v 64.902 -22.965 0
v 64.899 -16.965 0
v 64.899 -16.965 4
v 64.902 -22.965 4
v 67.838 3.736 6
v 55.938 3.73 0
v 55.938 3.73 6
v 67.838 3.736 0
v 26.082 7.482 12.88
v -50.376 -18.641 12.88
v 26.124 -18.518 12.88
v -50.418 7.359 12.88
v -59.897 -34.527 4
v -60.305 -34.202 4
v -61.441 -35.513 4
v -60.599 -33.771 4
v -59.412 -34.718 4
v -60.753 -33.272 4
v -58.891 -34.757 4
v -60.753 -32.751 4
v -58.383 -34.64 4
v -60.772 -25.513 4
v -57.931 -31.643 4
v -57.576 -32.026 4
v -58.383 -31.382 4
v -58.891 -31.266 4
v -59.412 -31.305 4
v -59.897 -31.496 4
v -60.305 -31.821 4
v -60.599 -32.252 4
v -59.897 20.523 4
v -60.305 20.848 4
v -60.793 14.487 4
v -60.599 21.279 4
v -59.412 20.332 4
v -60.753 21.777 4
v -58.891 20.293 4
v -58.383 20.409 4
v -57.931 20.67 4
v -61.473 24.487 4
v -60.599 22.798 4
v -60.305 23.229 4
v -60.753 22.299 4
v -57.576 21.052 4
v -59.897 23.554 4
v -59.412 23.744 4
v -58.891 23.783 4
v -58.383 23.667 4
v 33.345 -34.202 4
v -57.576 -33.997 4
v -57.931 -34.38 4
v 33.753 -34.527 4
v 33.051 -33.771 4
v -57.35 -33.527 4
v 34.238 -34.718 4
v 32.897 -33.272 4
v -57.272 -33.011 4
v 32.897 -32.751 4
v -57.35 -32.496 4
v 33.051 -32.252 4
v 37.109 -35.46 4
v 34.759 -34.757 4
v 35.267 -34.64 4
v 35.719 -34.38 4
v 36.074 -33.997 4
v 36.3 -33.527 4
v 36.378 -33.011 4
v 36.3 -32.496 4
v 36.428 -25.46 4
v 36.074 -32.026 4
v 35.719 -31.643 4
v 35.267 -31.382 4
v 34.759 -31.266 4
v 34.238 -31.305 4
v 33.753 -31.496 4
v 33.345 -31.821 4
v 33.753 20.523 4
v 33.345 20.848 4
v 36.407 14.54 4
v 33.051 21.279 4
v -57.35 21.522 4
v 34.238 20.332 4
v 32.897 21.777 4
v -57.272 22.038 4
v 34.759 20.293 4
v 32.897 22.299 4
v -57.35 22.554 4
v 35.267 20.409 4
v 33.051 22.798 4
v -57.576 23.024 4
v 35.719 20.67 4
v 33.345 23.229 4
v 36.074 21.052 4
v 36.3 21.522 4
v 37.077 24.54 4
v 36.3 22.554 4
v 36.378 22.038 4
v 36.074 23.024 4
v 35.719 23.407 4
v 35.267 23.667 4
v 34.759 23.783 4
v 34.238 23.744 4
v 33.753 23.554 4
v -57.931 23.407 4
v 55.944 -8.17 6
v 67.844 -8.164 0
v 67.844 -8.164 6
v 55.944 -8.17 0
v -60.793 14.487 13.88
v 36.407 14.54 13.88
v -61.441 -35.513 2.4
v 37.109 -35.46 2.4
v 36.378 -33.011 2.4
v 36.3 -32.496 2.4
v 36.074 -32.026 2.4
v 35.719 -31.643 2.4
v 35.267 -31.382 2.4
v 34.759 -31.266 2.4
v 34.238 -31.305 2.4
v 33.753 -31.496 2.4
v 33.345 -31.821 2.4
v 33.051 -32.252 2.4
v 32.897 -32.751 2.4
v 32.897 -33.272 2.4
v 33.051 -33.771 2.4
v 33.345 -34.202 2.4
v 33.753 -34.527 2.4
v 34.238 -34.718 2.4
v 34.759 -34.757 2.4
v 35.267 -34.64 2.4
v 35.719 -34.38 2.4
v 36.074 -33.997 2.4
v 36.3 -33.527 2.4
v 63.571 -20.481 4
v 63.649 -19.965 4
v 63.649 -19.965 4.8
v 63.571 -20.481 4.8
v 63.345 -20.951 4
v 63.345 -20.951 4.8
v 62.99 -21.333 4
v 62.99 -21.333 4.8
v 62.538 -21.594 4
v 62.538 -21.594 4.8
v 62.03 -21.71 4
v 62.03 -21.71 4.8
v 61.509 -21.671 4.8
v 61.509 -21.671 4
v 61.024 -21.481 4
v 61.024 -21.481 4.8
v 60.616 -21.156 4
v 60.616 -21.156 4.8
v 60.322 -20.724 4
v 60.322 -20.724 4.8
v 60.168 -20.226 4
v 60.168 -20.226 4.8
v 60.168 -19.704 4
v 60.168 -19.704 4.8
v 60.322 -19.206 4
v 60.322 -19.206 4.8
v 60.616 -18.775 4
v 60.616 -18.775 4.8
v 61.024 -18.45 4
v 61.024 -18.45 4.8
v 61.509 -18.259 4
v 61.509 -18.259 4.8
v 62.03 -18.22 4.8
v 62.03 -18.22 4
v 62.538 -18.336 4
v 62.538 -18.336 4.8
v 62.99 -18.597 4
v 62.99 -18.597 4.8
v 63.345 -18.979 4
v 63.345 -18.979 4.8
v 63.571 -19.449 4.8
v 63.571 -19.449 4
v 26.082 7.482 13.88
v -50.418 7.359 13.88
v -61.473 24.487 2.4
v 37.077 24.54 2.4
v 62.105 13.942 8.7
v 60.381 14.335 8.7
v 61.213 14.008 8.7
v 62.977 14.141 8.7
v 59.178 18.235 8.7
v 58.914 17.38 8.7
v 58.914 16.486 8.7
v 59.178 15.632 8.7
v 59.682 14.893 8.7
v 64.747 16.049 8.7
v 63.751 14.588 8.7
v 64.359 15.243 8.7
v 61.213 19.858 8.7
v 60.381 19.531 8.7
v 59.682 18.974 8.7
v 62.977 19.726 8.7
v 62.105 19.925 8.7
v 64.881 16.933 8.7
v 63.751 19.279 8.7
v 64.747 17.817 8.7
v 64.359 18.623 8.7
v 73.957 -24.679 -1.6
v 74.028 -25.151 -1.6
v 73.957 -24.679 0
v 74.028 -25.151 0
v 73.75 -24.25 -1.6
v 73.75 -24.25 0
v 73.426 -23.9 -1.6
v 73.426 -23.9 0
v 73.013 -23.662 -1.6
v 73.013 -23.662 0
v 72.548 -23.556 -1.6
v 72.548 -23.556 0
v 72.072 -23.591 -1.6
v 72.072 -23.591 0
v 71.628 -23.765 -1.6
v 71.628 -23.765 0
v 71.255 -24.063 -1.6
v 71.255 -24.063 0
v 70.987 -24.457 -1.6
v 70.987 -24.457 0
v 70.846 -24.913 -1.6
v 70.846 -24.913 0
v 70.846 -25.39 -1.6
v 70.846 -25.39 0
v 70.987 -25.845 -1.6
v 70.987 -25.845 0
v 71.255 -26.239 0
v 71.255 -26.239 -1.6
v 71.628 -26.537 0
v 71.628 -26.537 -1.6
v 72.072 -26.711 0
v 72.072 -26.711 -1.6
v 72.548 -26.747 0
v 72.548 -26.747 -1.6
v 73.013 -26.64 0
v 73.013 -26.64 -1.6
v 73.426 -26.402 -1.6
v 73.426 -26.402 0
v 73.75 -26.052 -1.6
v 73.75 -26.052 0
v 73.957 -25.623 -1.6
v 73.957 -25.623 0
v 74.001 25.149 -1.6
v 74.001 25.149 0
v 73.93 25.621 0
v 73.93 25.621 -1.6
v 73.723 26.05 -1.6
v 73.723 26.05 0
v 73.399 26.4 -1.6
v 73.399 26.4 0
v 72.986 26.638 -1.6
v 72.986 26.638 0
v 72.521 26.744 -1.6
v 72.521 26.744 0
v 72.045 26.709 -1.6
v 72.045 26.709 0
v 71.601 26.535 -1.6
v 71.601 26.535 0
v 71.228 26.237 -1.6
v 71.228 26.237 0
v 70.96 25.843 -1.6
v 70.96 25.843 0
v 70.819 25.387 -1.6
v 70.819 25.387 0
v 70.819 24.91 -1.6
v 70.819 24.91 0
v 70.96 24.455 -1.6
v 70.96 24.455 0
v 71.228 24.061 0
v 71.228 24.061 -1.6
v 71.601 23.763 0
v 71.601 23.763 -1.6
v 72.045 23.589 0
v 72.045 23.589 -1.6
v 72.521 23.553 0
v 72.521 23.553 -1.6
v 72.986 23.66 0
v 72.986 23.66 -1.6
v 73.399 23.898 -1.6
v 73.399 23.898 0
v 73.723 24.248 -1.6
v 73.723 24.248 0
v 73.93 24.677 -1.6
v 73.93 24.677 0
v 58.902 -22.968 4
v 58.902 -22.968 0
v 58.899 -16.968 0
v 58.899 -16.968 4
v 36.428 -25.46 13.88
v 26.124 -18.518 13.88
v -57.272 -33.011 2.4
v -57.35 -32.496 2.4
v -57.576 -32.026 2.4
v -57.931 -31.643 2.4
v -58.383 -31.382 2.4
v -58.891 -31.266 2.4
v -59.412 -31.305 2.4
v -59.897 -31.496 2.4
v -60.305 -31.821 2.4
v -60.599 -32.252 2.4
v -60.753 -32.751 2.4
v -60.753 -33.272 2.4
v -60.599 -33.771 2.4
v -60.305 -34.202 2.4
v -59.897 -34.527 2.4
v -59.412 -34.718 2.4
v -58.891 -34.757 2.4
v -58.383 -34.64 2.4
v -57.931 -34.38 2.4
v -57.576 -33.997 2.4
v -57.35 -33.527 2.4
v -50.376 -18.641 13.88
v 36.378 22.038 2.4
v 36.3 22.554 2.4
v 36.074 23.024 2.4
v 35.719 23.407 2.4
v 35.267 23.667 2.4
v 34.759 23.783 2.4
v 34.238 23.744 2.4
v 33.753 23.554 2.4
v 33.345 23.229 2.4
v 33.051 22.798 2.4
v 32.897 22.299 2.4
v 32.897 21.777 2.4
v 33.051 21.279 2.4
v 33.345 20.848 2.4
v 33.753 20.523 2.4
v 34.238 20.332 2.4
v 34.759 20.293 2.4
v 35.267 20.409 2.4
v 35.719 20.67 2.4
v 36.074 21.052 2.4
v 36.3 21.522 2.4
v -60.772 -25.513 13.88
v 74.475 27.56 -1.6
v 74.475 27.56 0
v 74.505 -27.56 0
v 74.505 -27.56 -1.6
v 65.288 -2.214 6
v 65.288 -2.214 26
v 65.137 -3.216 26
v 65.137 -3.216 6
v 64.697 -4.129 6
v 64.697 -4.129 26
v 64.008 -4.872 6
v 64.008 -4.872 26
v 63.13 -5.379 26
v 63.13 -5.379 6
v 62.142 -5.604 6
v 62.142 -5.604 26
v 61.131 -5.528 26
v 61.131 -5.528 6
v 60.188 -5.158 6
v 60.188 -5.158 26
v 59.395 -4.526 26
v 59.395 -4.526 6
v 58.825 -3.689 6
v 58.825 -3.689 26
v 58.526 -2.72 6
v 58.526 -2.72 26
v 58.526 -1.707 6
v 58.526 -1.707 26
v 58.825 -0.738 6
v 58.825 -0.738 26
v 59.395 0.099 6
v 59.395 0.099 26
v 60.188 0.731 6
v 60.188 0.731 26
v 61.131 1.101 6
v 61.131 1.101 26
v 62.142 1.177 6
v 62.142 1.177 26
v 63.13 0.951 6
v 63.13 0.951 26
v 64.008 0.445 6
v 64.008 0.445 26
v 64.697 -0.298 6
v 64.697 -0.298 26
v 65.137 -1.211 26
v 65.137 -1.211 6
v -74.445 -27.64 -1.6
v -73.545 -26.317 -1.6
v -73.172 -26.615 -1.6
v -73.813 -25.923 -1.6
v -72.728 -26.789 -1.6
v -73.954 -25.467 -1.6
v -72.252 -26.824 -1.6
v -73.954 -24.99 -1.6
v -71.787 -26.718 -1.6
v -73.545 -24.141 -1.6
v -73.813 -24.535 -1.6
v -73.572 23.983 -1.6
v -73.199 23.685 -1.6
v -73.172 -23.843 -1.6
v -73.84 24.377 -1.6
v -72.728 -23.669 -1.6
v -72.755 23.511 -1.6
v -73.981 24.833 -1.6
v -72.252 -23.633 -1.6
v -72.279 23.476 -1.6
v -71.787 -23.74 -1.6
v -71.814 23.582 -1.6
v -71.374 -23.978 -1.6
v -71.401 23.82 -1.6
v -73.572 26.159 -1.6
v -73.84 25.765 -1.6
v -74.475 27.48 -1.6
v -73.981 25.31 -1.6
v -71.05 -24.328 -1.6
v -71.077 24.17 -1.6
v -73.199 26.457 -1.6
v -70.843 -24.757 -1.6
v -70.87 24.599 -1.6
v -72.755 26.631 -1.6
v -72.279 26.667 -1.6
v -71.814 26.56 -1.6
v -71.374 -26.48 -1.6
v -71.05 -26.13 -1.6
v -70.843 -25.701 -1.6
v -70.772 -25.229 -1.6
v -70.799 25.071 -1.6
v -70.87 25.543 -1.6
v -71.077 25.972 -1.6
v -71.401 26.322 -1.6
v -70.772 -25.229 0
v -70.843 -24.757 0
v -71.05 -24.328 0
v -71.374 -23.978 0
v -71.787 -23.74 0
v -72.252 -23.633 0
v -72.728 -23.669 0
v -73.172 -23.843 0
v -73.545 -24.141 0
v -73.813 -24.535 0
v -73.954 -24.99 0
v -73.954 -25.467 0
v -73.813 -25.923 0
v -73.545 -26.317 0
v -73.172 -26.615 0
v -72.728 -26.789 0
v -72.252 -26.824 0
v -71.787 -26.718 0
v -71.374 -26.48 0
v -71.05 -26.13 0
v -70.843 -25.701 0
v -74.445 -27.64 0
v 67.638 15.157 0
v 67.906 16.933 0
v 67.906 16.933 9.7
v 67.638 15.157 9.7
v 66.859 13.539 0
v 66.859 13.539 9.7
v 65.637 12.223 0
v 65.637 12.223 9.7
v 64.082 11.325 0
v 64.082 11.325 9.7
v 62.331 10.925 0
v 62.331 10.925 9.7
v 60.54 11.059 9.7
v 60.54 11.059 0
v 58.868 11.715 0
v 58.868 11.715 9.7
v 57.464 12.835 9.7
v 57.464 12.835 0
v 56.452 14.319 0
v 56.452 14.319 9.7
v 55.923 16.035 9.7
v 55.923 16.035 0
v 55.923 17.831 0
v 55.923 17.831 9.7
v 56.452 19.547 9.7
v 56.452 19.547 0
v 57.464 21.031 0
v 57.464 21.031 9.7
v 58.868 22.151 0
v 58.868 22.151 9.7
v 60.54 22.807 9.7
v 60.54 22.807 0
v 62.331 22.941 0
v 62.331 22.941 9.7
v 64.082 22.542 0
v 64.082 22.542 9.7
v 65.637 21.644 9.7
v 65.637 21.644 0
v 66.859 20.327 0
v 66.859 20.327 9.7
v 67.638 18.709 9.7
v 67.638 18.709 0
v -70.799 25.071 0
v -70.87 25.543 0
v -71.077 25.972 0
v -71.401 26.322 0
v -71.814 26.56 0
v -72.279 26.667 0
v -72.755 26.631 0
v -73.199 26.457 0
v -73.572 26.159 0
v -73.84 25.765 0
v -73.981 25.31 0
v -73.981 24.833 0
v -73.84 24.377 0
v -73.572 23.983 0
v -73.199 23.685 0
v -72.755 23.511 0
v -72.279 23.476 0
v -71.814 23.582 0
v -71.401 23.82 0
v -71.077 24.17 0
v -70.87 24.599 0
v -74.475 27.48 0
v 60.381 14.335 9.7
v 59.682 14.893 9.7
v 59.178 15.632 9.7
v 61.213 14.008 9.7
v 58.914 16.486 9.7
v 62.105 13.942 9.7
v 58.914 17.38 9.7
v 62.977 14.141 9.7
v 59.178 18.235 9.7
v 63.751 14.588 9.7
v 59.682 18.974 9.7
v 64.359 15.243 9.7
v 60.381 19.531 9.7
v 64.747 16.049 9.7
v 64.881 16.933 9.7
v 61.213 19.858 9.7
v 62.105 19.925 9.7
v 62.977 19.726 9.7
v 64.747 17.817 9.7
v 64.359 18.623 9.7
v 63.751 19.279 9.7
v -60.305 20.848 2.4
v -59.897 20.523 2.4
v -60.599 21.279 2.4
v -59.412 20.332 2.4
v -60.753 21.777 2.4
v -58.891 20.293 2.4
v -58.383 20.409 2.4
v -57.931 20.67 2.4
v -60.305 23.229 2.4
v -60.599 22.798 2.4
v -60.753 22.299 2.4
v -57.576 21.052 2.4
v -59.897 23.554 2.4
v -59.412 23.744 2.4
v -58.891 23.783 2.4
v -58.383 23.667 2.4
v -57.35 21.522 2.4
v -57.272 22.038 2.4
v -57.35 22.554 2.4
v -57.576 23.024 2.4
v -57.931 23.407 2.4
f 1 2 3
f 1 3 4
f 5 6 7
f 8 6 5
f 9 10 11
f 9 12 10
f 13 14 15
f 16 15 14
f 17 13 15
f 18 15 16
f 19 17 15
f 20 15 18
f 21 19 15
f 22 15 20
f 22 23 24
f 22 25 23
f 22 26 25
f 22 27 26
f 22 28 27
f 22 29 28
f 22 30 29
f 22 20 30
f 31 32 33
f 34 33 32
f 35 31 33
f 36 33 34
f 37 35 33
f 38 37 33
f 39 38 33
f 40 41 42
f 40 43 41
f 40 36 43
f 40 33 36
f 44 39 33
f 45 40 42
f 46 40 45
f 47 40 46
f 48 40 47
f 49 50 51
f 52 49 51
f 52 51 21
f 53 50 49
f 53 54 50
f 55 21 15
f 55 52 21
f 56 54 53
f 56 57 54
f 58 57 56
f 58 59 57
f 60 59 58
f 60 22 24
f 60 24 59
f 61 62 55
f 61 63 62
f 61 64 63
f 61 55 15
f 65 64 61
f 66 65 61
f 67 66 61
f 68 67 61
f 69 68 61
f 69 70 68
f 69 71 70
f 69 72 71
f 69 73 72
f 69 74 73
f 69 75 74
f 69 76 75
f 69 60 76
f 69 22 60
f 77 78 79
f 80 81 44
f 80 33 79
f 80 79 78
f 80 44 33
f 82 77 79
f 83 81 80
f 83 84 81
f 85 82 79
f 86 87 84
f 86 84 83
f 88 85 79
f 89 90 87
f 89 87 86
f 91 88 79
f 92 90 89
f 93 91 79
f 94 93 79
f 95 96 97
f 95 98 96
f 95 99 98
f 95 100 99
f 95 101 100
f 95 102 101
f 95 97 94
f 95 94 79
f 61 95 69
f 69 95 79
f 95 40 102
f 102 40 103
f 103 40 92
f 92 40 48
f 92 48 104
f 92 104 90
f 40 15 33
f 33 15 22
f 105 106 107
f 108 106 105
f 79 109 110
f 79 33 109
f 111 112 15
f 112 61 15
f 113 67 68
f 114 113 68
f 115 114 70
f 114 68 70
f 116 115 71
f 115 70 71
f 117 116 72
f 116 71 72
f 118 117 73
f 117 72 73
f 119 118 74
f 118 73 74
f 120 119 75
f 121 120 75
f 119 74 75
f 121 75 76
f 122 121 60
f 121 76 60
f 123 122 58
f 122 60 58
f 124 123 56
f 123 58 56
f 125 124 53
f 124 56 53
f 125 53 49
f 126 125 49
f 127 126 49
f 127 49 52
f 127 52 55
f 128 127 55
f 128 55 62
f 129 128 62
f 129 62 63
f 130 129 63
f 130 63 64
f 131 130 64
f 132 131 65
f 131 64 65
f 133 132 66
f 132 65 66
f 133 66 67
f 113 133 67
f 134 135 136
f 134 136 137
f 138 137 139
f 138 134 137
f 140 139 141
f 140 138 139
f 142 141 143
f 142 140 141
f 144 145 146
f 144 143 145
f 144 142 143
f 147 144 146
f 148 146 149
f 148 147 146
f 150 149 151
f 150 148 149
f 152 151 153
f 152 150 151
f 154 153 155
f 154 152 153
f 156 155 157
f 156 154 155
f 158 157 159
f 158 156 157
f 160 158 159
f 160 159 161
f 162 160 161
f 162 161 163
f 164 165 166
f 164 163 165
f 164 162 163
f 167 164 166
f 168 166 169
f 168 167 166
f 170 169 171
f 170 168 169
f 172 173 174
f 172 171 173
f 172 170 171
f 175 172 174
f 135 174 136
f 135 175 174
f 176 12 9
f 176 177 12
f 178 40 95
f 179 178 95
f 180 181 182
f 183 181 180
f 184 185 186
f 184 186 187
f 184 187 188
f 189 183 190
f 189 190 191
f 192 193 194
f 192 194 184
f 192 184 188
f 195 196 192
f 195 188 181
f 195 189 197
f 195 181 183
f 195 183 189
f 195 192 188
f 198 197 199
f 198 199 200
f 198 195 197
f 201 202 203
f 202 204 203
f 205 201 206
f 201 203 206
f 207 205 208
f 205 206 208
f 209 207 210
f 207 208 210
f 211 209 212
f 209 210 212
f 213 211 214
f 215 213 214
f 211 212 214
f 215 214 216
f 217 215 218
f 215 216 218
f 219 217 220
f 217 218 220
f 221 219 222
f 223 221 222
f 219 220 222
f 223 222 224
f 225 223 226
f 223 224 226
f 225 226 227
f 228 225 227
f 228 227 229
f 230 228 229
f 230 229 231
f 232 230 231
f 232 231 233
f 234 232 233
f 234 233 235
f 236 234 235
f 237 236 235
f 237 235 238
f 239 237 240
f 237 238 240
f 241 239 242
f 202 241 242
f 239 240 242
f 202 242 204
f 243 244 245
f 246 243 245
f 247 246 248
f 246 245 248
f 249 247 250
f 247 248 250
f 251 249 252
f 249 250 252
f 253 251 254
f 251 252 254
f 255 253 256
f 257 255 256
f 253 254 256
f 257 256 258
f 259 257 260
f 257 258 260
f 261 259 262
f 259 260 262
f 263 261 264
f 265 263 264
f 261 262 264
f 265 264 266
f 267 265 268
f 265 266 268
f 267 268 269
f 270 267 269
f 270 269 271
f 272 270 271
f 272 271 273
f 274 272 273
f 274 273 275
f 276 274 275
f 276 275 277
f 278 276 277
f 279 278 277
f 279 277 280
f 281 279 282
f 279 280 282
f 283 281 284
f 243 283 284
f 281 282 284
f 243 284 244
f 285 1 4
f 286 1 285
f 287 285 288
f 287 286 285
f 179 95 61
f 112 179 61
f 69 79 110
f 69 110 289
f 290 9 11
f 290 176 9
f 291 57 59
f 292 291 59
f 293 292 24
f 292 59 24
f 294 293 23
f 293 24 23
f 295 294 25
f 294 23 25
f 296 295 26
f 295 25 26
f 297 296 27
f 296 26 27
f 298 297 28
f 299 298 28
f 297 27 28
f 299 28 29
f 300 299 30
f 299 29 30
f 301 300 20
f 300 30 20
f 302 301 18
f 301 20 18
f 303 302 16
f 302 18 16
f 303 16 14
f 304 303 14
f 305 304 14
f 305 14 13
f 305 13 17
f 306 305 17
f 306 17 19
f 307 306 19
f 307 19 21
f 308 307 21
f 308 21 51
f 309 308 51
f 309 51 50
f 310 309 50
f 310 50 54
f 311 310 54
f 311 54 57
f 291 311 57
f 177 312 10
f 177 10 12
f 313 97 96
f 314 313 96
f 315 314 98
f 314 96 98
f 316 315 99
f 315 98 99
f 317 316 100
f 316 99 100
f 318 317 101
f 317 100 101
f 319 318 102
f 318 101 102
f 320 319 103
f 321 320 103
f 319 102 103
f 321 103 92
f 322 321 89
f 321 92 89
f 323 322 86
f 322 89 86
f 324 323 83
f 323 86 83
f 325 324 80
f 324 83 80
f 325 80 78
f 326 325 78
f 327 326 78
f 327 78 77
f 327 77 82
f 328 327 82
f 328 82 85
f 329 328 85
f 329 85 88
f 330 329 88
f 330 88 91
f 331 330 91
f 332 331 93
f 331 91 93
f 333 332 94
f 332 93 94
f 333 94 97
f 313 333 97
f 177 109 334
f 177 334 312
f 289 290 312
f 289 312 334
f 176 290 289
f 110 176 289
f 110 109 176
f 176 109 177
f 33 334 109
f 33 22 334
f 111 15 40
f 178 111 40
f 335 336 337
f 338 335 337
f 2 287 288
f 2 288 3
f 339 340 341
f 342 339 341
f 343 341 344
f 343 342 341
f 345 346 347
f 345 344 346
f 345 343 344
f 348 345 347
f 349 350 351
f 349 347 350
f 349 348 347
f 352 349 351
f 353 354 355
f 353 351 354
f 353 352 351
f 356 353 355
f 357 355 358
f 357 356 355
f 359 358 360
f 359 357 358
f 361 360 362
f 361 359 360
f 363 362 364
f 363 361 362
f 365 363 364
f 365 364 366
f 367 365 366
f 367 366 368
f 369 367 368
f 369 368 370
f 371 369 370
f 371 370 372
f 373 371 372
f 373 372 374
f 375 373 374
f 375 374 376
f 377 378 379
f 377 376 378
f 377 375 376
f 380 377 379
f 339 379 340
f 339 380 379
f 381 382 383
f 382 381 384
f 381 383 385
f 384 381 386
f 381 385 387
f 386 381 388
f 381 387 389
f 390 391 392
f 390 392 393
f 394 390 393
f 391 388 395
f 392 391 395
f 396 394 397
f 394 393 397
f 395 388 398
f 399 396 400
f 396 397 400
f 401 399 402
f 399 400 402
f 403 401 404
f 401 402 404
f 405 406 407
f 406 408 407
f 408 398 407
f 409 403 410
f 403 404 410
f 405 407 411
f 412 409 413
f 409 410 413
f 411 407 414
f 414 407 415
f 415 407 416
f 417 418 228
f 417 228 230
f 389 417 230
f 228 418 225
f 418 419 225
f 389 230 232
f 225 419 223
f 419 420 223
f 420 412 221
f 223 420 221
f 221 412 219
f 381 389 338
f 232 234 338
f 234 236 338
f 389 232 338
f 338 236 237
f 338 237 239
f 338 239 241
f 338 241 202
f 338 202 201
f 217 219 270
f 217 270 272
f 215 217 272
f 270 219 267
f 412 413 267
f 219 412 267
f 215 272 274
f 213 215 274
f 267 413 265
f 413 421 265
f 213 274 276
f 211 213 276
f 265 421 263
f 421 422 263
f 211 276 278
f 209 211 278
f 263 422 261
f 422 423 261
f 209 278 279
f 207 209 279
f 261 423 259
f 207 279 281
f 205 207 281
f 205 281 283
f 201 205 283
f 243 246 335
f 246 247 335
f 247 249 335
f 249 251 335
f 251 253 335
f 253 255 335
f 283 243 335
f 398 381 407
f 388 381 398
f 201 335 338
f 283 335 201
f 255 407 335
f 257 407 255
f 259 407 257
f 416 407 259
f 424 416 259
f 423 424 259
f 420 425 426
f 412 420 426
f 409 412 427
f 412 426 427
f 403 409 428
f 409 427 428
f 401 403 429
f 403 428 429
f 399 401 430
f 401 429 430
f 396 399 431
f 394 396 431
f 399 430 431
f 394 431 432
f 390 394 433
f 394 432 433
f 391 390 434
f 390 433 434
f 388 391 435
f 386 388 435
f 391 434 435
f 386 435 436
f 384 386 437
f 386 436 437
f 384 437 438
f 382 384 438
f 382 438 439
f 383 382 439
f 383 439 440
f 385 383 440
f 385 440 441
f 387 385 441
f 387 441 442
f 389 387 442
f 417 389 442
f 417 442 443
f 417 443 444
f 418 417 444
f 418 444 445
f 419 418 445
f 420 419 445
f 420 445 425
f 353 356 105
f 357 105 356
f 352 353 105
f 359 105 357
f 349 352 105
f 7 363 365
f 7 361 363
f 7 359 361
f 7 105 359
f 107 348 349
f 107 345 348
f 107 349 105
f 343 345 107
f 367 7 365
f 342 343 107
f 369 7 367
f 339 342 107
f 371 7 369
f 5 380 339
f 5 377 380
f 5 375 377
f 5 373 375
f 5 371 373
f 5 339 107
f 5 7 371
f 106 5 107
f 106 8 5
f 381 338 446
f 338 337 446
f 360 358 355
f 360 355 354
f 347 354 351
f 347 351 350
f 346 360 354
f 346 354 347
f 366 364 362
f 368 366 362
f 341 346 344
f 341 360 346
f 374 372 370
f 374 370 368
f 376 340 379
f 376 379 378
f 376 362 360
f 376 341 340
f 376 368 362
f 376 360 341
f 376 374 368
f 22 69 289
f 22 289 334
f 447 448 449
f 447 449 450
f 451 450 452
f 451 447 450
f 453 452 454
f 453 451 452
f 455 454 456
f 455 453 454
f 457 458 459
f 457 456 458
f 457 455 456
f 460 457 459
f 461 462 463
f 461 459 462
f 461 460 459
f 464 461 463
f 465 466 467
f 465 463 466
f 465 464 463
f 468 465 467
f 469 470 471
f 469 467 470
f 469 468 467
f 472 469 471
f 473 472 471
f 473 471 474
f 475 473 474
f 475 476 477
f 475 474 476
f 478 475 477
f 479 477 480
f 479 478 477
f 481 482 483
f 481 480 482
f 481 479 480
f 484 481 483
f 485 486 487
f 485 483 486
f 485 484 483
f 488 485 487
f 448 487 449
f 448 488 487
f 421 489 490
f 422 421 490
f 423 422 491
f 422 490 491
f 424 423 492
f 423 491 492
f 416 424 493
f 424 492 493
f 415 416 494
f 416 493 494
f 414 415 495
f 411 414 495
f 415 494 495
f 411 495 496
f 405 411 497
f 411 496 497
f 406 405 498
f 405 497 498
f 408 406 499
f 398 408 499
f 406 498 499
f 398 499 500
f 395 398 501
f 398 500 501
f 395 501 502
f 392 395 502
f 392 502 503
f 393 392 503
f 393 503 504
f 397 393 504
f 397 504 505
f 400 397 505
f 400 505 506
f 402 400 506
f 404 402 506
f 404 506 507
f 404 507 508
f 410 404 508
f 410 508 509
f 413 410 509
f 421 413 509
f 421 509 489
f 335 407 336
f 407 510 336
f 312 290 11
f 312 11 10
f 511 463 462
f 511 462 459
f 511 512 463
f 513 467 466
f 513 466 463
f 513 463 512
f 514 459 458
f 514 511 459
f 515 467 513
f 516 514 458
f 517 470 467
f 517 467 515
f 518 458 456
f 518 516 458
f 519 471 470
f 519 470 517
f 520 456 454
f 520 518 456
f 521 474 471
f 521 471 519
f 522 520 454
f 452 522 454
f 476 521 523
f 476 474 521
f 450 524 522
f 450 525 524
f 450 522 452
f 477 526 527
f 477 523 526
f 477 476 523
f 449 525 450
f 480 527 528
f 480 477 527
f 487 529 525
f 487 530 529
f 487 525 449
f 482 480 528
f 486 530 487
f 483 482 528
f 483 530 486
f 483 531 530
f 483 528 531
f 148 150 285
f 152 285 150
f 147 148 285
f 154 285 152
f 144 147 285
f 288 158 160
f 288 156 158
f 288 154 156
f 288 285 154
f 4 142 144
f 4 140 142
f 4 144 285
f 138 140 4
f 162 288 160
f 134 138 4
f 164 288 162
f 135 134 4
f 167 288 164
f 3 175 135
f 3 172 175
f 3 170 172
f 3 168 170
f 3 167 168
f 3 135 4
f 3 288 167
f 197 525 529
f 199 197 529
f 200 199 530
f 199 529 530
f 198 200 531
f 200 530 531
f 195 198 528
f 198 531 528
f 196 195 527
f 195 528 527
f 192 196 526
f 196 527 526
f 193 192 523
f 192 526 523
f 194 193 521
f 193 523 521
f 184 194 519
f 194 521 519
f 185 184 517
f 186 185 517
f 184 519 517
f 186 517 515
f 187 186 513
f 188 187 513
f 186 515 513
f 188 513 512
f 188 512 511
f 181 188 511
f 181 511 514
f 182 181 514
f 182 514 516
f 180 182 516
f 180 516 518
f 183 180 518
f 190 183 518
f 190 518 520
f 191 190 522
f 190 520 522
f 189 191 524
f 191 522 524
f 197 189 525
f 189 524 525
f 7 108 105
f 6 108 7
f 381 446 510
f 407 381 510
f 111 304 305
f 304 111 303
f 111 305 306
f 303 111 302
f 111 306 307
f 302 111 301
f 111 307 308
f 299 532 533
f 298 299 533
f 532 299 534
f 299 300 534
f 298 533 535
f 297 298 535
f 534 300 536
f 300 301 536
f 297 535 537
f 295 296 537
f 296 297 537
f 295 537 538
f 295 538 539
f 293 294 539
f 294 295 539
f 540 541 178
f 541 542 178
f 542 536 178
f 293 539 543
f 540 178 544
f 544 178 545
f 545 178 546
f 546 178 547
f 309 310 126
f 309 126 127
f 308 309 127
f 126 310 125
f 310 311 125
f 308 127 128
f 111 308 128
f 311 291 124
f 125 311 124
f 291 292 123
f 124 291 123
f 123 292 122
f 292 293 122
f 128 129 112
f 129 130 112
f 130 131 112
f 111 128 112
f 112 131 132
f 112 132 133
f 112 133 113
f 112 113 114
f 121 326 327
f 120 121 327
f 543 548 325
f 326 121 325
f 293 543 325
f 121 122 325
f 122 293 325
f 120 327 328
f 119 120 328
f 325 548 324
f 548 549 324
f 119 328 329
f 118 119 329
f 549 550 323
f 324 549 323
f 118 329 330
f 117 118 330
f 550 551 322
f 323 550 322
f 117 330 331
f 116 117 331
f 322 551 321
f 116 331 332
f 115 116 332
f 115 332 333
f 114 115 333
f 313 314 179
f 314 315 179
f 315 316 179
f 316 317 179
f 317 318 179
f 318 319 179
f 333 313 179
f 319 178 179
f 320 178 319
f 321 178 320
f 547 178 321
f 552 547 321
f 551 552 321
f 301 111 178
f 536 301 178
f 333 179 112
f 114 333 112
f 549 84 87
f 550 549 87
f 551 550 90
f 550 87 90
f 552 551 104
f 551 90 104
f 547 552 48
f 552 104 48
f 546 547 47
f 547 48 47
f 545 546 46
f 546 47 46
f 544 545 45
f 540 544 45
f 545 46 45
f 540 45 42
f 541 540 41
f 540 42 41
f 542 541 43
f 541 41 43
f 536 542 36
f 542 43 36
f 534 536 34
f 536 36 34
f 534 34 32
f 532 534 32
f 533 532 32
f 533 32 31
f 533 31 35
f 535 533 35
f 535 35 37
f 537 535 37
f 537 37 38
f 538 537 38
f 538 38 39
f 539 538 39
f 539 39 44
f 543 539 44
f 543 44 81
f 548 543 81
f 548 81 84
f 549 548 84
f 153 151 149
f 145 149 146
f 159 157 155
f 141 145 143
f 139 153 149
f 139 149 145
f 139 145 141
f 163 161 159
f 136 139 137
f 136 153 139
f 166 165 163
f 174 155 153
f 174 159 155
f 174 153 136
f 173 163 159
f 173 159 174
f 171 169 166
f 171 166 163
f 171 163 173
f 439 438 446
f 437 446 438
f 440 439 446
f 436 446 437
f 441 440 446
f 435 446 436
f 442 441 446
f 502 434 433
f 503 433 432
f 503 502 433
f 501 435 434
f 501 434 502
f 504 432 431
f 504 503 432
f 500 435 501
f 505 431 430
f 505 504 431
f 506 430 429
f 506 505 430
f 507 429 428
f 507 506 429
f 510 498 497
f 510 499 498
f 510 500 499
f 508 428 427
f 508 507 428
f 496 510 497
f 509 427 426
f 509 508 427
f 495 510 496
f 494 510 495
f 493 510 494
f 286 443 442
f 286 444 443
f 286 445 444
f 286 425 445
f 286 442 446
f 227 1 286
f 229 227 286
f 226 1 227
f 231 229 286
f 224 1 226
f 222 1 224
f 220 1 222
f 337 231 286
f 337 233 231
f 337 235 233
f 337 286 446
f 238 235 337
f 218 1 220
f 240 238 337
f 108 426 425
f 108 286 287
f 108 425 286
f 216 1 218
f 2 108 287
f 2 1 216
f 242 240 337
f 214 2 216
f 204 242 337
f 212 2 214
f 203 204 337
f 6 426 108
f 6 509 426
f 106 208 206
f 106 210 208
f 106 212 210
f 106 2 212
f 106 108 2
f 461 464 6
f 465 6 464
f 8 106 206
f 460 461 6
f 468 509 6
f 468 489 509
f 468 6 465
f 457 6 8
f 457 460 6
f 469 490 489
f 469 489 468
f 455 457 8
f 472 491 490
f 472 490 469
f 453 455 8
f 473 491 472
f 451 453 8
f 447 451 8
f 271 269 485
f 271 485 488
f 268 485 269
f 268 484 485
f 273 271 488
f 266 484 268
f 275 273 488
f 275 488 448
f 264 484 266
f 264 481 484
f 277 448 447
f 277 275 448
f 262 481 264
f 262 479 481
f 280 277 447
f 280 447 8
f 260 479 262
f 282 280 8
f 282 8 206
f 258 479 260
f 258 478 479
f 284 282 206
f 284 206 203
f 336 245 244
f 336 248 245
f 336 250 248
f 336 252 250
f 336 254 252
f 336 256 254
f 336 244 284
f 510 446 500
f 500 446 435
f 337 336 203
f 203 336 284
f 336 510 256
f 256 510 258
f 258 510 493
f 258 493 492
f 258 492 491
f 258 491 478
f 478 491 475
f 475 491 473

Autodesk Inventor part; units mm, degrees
ref_plane "YZ Plane" through (0, 0, 0) normal (1, 0, 0) x (0, 1, 0)
ref_plane "XZ Plane" through (0, 0, 0) normal (0, 1, 0) x (-1, 0, 0)
sketch "LCD Screen" plane through (0, 0, 0) normal (0, 0, 1) x (1, 0, 0)
  line L0 (-74.575, 27.52) -> (74.375, 27.52)
  line L1 (74.375, 27.52) -> (74.375, -27.6)
  line L2 (74.375, -27.6) -> (-74.575, -27.6)
  line L3 (-74.575, -27.6) -> (-74.575, 27.52)
  circle A0 centre (-72.5, 25.11) radius 1.6
  circle A1 centre (72.3, 25.11) radius 1.6
  circle A2 centre (72.3, -25.19) radius 1.6
  circle A3 centre (-72.5, -25.19) radius 1.6
  circle A4 centre (61.775, 16.9) radius 6.025
  line L4 (55.825, 3.7) -> (67.725, 3.7)
  line L5 (67.725, 3.7) -> (67.725, -8.2)
  line L6 (67.725, -8.2) -> (55.825, -8.2)
  line L7 (55.825, -8.2) -> (55.825, 3.7)
  line L8 (58.775, -17) -> (64.775, -17)
  line L9 (64.775, -17) -> (64.775, -23)
  line L10 (64.775, -23) -> (58.775, -23)
  line L11 (58.775, -23) -> (58.775, -17)
  line L12 (-61.575, 24.52) -> (36.975, 24.52)
  line L13 (36.975, 24.52) -> (36.975, -35.48)
  line L14 (36.975, -35.48) -> (-61.575, -35.48)
  line L15 (-61.575, -35.48) -> (-61.575, 24.52)
  line L16 (-60.9, 14.52) -> (36.3, 14.52)
  line L17 (36.3, 14.52) -> (36.3, -25.48)
  line L18 (36.3, -25.48) -> (-60.9, -25.48)
  line L19 (-60.9, -25.48) -> (-60.9, 14.52)
  line L20 (-50.55, 7.52) -> (25.95, 7.52)
  line L21 (25.95, 7.52) -> (25.95, -18.48)
  line L22 (25.95, -18.48) -> (-50.55, -18.48)
  line L23 (-50.55, -18.48) -> (-50.55, 7.52)
  line L24 (-74.575, -0.04) -> (74.375, -0.04)
  line L25 (-0.1, 27.52) -> (-0.1, -27.6)
  line L26 (55.825, -2.25) -> (67.725, -2.25)
  line L27 (61.775, 3.7) -> (61.775, -8.2)
  line L28 (61.775, -17) -> (61.775, -23)
  line L29 (58.775, -20) -> (64.775, -20)
  line L30 (-12.3, 24.52) -> (-12.3, -35.48)
  line L31 (-61.575, -5.48) -> (36.975, -5.48)
  point P0 (14.168, -4.3108)
  point P1 (-12.3, 7.52)
  point P2 (-12.3, 14.52)
  point P3 (-50.55, -5.48)
  point P4 (-60.9, -5.48)
  point P5 (61.775, -2.25)
  point P6 (61.775, -2.25)
  point P7 (61.775, -20)
  dimension "d0" = 148.95
  dimension "d1" = 55.12
  dimension "d2" = 3.2
  dimension "d3" = 3.2
  dimension "d4" = 3.2
  dimension "d5" = 3.2
  dimension "d11" = 12.05
  dimension "d14" = 11.9
  dimension "d15" = 11.9
  dimension "d17" = 6
  dimension "d18" = 6
  dimension "d21" = 60
  dimension "d23" = 13
  dimension "d24" = 97.2
  dimension "d25" = 40
  dimension "d27" = 26
  dimension "d28" = 76.5
  dimension "d59" = 50.3
  dimension "d60" = 25.15
  dimension "d61" = 144.8
  dimension "d62" = 72.4
  dimension "d63" = 13.2
  dimension "d64" = 8.8
  dimension "d65" = 9.6
  dimension "d66" = 3
  dimension "d67" = 10
  dimension "d68" = 4.6
sketch "Sketch1" plane through (0, 0, 0) normal (0, 0, 1) x (1, 0, 0)
  line L0 (-74.475, 27.48) -> (74.475, 27.56)
  line L1 (74.475, 27.56) -> (74.5046, -27.56)
  line L2 (74.5046, -27.56) -> (-74.4454, -27.64)
  line L3 (-74.4454, -27.64) -> (-74.475, 27.48)
  circle A0 centre (-72.3987, 25.0711) radius 1.6
  circle A1 centre (72.4013, 25.1489) radius 1.6
  circle A2 centre (72.4283, -25.1511) radius 1.6
  circle A3 centre (-72.3717, -25.2289) radius 1.6
  circle A4 centre (61.8807, 16.9332) radius 6.025
  line L4 (55.9378, 3.73) -> (67.8378, 3.7364)
  line L5 (67.8378, 3.7364) -> (67.8442, -8.1636)
  line L6 (67.8442, -8.1636) -> (55.9442, -8.17)
  line L7 (55.9442, -8.17) -> (55.9378, 3.73)
  line L8 (58.8989, -16.9684) -> (64.8989, -16.9652)
  line L9 (64.8989, -16.9652) -> (64.9021, -22.9652)
  line L10 (64.9021, -22.9652) -> (58.9021, -22.9684)
  line L11 (58.9021, -22.9684) -> (58.8989, -16.9684)
  line L12 (-61.4734, 24.487) -> (37.0766, 24.5399)
  line L13 (37.0766, 24.5399) -> (37.1088, -35.4601)
  line L14 (37.1088, -35.4601) -> (-61.4412, -35.513)
  line L15 (-61.4412, -35.513) -> (-61.4734, 24.487)
  line L16 (-60.793, 14.4873) -> (36.407, 14.5396)
  line L17 (36.407, 14.5396) -> (36.4285, -25.4604)
  line L18 (36.4285, -25.4604) -> (-60.7715, -25.5126)
  line L19 (-60.7715, -25.5126) -> (-60.793, 14.4873)
  line L20 (-50.4393, 7.4929) -> (26.0607, 7.534)
  line L21 (26.0607, 7.534) -> (26.0747, -18.466)
  line L22 (26.0747, -18.466) -> (-50.4253, -18.5071)
  line L23 (-50.4253, -18.5071) -> (-50.4393, 7.4929)
  line L24 (-74.4602, -0.08) -> (74.4898, 0)
  line L25 (0, 27.52) -> (0.0296, -27.6)
  line L26 (55.941, -2.22) -> (67.841, -2.2136)
  line L27 (61.8878, 3.7332) -> (61.8942, -8.1668)
  line L28 (61.8989, -16.9668) -> (61.9021, -22.9668)
  line L29 (58.9005, -19.9684) -> (64.9005, -19.9652)
  line L30 (-12.1984, 24.5134) -> (-12.1662, -35.4865)
  line L31 (-61.4573, -5.513) -> (37.0927, -5.4601)
  point P0 (0, 0)
extrude "Extrusion1" add sketch "Sketch1" against normal blind 1.6 contours L0 L25 L12 L15 L24 L3 | L0 L1 L24 L5 L4 L7 L13 L12 L25 | L24 L15 L2 L3 | L25 L16 L30 L12 | L12 L13 L24 L17 L16 L25 | L24 L19 L31 L15 | L15 L12 L30 L16 L19 L24 | L1 L2 L13 L24 L7 L6 L5 | L25 L20 L30 L16 | L16 L17 L24 L21 L20 L25 | L15 L31 L19 L18 L30 L2 | L24 L23 L31 L19 | L19 L16 L30 L20 L23 L24 | L24 L27 L4 L5 | L5 L26 L27 L24 | L13 L31 L17 L24 | L25 L24 L30 L20 | L20 L21 L24 L25 | L30 L18 L25 L2 | L31 L23 L22 L30 L18 L19 | L24 L30 L31 L23 | L23 L20 L30 L24 | L2 L25 L18 L17 L31 L13 | L5 L6 L27 L26 | L27 L26 L7 L24 | L24 L7 L4 L27 | L17 L31 L21 L24 | L25 L31 L30 L24 | L24 L21 L31 L25 | L30 L22 L25 L18 | L31 L30 L22 L23 | L27 L6 L7 L26 | L17 L18 L25 L22 L21 L31 | L31 L21 L22 L25 | L25 L22 L30 L31 | A4 | L8 L28 L29 L11 | L8 L9 L29 L28 | L29 L28 L10 L11 | L29 L9 L10 L28
extrude "Extrusion2" add sketch "Sketch1" along normal blind 9.7 contours A4
ref_plane "Work Plane1" through (0, 0, 4) normal (0, 0, 1) x (1, 0, 0)
sketch "Sketch2" plane through (0, 0, 4) normal (0, 0, 1) x (1, 0, 0)
  line L0 (-74.4454, -27.64) -> (-74.475, 27.48) projected
  line L1 (-74.475, 27.48) -> (74.475, 27.56) projected
  line L2 (-74.475, 27.48) -> (74.475, 27.56)
  line L3 (74.475, 27.56) -> (74.5046, -27.56)
  line L4 (74.5046, -27.56) -> (-74.4454, -27.64)
  line L5 (-74.4454, -27.64) -> (-74.475, 27.48)
  circle A0 centre (-72.3987, 25.0711) radius 1.6
  circle A1 centre (72.4013, 25.1489) radius 1.6
  circle A2 centre (72.4283, -25.1511) radius 1.6
  circle A3 centre (-72.3717, -25.2289) radius 1.6
  circle A4 centre (61.8807, 16.9332) radius 6.025
  line L6 (55.9378, 3.73) -> (67.8378, 3.7364)
  line L7 (67.8378, 3.7364) -> (67.8442, -8.1636)
  line L8 (67.8442, -8.1636) -> (55.9442, -8.17)
  line L9 (55.9442, -8.17) -> (55.9378, 3.73)
  line L10 (58.8989, -16.9684) -> (64.8989, -16.9652)
  line L11 (64.8989, -16.9652) -> (64.9021, -22.9652)
  line L12 (64.9021, -22.9652) -> (58.9021, -22.9684)
  line L13 (58.9021, -22.9684) -> (58.8989, -16.9684)
  line L14 (-61.4734, 24.487) -> (37.0766, 24.5399)
  line L15 (37.0766, 24.5399) -> (37.1088, -35.4601)
  line L16 (37.1088, -35.4601) -> (-61.4412, -35.513)
  line L17 (-61.4412, -35.513) -> (-61.4734, 24.487)
  line L18 (-60.793, 14.4873) -> (36.407, 14.5396)
  line L19 (36.407, 14.5396) -> (36.4285, -25.4604)
  line L20 (36.4285, -25.4604) -> (-60.7715, -25.5126)
  line L21 (-60.7715, -25.5126) -> (-60.793, 14.4873)
  line L22 (-50.4393, 7.4929) -> (26.0607, 7.534)
  line L23 (26.0607, 7.534) -> (26.0747, -18.466)
  line L24 (26.0747, -18.466) -> (-50.4253, -18.5071)
  line L25 (-50.4253, -18.5071) -> (-50.4393, 7.4929)
  line L26 (-74.4602, -0.08) -> (74.4898, 0)
  line L27 (0, 27.52) -> (0.0296, -27.6)
  line L28 (55.941, -2.22) -> (67.841, -2.2136)
  line L29 (61.8878, 3.7332) -> (61.8942, -8.1668)
  line L30 (61.8989, -16.9668) -> (61.9021, -22.9668)
  line L31 (58.9005, -19.9684) -> (64.9005, -19.9652)
  line L32 (-12.1984, 24.5134) -> (-12.1662, -35.4865)
  line L33 (-61.4573, -5.513) -> (37.0927, -5.4601)
  point P0 (0, 0)
extrude "Extrusion3" add sketch "Sketch2" against normal blind 1.6 contours L17 L33 L21 L20 L32 L4 | L4 L32 L16 L17 | L26 L21 L33 L17 | L17 L14 L32 L18 L21 L26 | L32 L20 L27 L4 | L4 L15 L16 L32 | L26 L25 L33 L21 | L21 L18 L32 L22 L25 L26 | L27 L20 L19 L33 L15 L4 | L32 L24 L27 L20 | L20 L21 L33 L25 L24 L32 | L27 L18 L32 L14 | L14 L15 L26 L19 L18 L27 | L26 L32 L33 L25 | L25 L22 L32 L26 | L27 L24 L23 L33 L19 L20 | L32 L33 L27 L24 | L24 L25 L33 L32 | L27 L22 L32 L18 | L18 L19 L26 L23 L22 L27 | L32 L22 L27 L26 | L26 L27 L33 L32 | L33 L19 L26 L15 | L27 L33 L23 L24 | L22 L23 L26 L27 | L26 L23 L33 L27 | L33 L23 L26 L19
extrude "Extrusion4" add sketch "Sketch2" along normal blind 9.88 contours L26 L25 L33 L21 | L21 L18 L32 L22 L25 L26 | L32 L24 L27 L20 | L20 L21 L33 L25 L24 L32 | L26 L32 L33 L25 | L25 L22 L32 L26 | L27 L24 L23 L33 L19 L20 | L32 L33 L27 L24 | L24 L25 L33 L32 | L27 L22 L32 L18 | L18 L19 L26 L23 L22 L27 | L32 L22 L27 L26 | L26 L27 L33 L32 | L27 L33 L23 L24 | L22 L23 L26 L27 | L26 L23 L33 L27 | L33 L23 L26 L19
sketch "Sketch3" plane through (0, 0, 13.88) normal (0, 0, 1) x (1, 0, 0)
  line L0 (74.475, 27.56) -> (74.5046, -27.56) projected
  line L1 (-74.475, 27.48) -> (74.475, 27.56) projected
  line L2 (-74.4749, 27.32) -> (74.4749, 27.56)
  line L3 (74.4749, 27.56) -> (74.5637, -27.56)
  line L4 (74.5637, -27.56) -> (-74.3861, -27.7999)
  line L5 (-74.3861, -27.7999) -> (-74.4749, 27.32)
  circle A0 centre (-72.396, 24.9134) radius 1.6
  circle A1 centre (72.4038, 25.1466) radius 1.6
  circle A2 centre (72.4848, -25.1533) radius 1.6
  circle A3 centre (-72.315, -25.3866) radius 1.6
  circle A4 centre (61.892, 16.9197) radius 6.025
  line L6 (55.9633, 3.7101) -> (67.8633, 3.7293)
  line L7 (67.8633, 3.7293) -> (67.8824, -8.1707)
  line L8 (67.8824, -8.1707) -> (55.9825, -8.1899)
  line L9 (55.9825, -8.1899) -> (55.9633, 3.7101)
  line L10 (58.9466, -16.9851) -> (64.9466, -16.9754)
  line L11 (64.9466, -16.9754) -> (64.9563, -22.9754)
  line L12 (64.9563, -22.9754) -> (58.9563, -22.9851)
  line L13 (58.9563, -22.9851) -> (58.9466, -16.9851)
  line L14 (-61.4701, 24.341) -> (37.0798, 24.4997)
  line L15 (37.0798, 24.4997) -> (37.1764, -35.5002)
  line L16 (37.1764, -35.5002) -> (-61.3734, -35.6589)
  line L17 (-61.3734, -35.6589) -> (-61.4701, 24.341)
  line L18 (-60.779, 14.3421) -> (36.4209, 14.4986)
  line L19 (36.4209, 14.4986) -> (36.4853, -25.5013)
  line L20 (36.4853, -25.5013) -> (-60.7145, -25.6579)
  line L21 (-60.7145, -25.6579) -> (-60.779, 14.3421)
  line L22 (-50.4177, 7.3588) -> (26.0822, 7.482)
  line L23 (26.0822, 7.482) -> (26.1241, -18.518)
  line L24 (26.1241, -18.518) -> (-50.3758, -18.6412)
  line L25 (-50.3758, -18.6412) -> (-50.4177, 7.3588)
  line L26 (-74.4305, -0.2399) -> (74.5193, 0)
  line L27 (0, 27.44) -> (0.0888, -27.6799)
  line L28 (55.9729, -2.2399) -> (67.8729, -2.2207)
  line L29 (61.9133, 3.7197) -> (61.9325, -8.1803)
  line L30 (61.9466, -16.9803) -> (61.9563, -22.9803)
  line L31 (58.9515, -19.9851) -> (64.9515, -19.9754)
  line L32 (-12.1952, 24.4204) -> (-12.0985, -35.5796)
  line L33 (-61.4218, -5.659) -> (37.1281, -5.5002)
  point P0 (0, 0)
  point P1 (74.4898, 0)
  point P2 (0, 27.52)
extrude "Extrusion5" cut sketch "Sketch3" against normal blind 1 contours L27 L26 L32 L22 | L22 L23 L26 L27 | L32 L26 L25 L22 | L27 L33 L32 L26 | L26 L23 L33 L27 | L27 L33 L23 L24 | L24 L32 L33 L27 | L26 L32 L33 L25 | L24 L25 L33 L32
sketch "Sketch4" plane through (0, 0, 4) normal (0, 0, 1) x (1, 0, 0)
  circle A0 centre (-59.0221, 22.0383) radius 1.75
  circle A1 centre (34.6279, 22.0383) radius 1.75
  circle A2 centre (-59.0221, -33.0114) radius 1.75
  circle A3 centre (34.6279, -33.0114) radius 1.75
  line L0 (-61.4734, 24.487) -> (37.0766, 24.5399) projected
  line L1 (-61.4412, -35.513) -> (-61.4734, 24.487) projected
  line L2 (37.1088, -35.4601) -> (-61.4412, -35.513) projected
  line L3 (37.0766, 24.5399) -> (37.1088, -35.4601) projected
  point P0 (0, 0)
  dimension "d40" = 3.5
  dimension "d42" = 2.45
  dimension "d43" = 2.45
  dimension "d44" = 2.45
  dimension "d45" = 2.45
extrude "Extrusion6" cut sketch "Sketch4" against normal blind 2 contours A0 | A1 | A2 | A3
extrude "Extrusion7" add sketch "Sketch1" along normal blind 6 contours L24 L27 L4 L5 | L5 L26 L27 L24 | L5 L6 L27 L26 | L27 L26 L7 L24 | L24 L7 L4 L27 | L27 L6 L7 L26
extrude "Extrusion8" add sketch "Sketch1" along normal blind 4 contours L8 L28 L29 L11 | L8 L9 L29 L28 | L29 L28 L10 L11 | L29 L9 L10 L28
sketch "Sketch5" plane through (0, 0, 6) normal (0, 0, 1) x (1, 0, 0)
  circle A0 centre (61.8878, -2.2136) radius 3.4
  line L0 (67.8442, -8.1636) -> (67.8378, 3.7364) projected
  line L1 (67.8378, 3.7364) -> (55.9378, 3.73) projected
  point P0 (0, 0)
  point P1 (67.841, -2.2136)
  point P2 (61.8878, 3.7332)
  dimension "d52" = 6.8
extrude "Extrusion9" add sketch "Sketch5" along normal blind 20
sketch "Sketch6" plane through (0, 0, 4) normal (0, 0, 1) x (1, 0, 0)
  circle A0 centre (61.8989, -19.9652) radius 1.75
  line L0 (64.8989, -16.9652) -> (58.8989, -16.9684) projected
  line L1 (64.9021, -22.9652) -> (64.8989, -16.9652) projected
  point P0 (0, 0)
  point P1 (61.8989, -16.9668)
  point P2 (64.9005, -19.9652)
  dimension "d55" = 3.5
extrude "Extrusion10" add sketch "Sketch6" along normal blind 0.8
sketch "Sketch7" plane through (61.8807, 16.9332, 9.7) normal (0, 0, 1) x (1, 0, 0)
  circle A0 centre (0, 0) radius 3
  point P0 (-61.8807, -16.9332)
  dimension "d69" = 6
extrude "Extrusion11" cut sketch "Sketch7" against normal blind 1
equation "\"d60\" = 0.5 * d59"
equation "\"d62\" = 0.5 * d61"
equation "\"d43\" = d42"
equation "\"d44\" = d43"
equation "\"d45\" = d43"
properties part number "2004A LCD Module"
